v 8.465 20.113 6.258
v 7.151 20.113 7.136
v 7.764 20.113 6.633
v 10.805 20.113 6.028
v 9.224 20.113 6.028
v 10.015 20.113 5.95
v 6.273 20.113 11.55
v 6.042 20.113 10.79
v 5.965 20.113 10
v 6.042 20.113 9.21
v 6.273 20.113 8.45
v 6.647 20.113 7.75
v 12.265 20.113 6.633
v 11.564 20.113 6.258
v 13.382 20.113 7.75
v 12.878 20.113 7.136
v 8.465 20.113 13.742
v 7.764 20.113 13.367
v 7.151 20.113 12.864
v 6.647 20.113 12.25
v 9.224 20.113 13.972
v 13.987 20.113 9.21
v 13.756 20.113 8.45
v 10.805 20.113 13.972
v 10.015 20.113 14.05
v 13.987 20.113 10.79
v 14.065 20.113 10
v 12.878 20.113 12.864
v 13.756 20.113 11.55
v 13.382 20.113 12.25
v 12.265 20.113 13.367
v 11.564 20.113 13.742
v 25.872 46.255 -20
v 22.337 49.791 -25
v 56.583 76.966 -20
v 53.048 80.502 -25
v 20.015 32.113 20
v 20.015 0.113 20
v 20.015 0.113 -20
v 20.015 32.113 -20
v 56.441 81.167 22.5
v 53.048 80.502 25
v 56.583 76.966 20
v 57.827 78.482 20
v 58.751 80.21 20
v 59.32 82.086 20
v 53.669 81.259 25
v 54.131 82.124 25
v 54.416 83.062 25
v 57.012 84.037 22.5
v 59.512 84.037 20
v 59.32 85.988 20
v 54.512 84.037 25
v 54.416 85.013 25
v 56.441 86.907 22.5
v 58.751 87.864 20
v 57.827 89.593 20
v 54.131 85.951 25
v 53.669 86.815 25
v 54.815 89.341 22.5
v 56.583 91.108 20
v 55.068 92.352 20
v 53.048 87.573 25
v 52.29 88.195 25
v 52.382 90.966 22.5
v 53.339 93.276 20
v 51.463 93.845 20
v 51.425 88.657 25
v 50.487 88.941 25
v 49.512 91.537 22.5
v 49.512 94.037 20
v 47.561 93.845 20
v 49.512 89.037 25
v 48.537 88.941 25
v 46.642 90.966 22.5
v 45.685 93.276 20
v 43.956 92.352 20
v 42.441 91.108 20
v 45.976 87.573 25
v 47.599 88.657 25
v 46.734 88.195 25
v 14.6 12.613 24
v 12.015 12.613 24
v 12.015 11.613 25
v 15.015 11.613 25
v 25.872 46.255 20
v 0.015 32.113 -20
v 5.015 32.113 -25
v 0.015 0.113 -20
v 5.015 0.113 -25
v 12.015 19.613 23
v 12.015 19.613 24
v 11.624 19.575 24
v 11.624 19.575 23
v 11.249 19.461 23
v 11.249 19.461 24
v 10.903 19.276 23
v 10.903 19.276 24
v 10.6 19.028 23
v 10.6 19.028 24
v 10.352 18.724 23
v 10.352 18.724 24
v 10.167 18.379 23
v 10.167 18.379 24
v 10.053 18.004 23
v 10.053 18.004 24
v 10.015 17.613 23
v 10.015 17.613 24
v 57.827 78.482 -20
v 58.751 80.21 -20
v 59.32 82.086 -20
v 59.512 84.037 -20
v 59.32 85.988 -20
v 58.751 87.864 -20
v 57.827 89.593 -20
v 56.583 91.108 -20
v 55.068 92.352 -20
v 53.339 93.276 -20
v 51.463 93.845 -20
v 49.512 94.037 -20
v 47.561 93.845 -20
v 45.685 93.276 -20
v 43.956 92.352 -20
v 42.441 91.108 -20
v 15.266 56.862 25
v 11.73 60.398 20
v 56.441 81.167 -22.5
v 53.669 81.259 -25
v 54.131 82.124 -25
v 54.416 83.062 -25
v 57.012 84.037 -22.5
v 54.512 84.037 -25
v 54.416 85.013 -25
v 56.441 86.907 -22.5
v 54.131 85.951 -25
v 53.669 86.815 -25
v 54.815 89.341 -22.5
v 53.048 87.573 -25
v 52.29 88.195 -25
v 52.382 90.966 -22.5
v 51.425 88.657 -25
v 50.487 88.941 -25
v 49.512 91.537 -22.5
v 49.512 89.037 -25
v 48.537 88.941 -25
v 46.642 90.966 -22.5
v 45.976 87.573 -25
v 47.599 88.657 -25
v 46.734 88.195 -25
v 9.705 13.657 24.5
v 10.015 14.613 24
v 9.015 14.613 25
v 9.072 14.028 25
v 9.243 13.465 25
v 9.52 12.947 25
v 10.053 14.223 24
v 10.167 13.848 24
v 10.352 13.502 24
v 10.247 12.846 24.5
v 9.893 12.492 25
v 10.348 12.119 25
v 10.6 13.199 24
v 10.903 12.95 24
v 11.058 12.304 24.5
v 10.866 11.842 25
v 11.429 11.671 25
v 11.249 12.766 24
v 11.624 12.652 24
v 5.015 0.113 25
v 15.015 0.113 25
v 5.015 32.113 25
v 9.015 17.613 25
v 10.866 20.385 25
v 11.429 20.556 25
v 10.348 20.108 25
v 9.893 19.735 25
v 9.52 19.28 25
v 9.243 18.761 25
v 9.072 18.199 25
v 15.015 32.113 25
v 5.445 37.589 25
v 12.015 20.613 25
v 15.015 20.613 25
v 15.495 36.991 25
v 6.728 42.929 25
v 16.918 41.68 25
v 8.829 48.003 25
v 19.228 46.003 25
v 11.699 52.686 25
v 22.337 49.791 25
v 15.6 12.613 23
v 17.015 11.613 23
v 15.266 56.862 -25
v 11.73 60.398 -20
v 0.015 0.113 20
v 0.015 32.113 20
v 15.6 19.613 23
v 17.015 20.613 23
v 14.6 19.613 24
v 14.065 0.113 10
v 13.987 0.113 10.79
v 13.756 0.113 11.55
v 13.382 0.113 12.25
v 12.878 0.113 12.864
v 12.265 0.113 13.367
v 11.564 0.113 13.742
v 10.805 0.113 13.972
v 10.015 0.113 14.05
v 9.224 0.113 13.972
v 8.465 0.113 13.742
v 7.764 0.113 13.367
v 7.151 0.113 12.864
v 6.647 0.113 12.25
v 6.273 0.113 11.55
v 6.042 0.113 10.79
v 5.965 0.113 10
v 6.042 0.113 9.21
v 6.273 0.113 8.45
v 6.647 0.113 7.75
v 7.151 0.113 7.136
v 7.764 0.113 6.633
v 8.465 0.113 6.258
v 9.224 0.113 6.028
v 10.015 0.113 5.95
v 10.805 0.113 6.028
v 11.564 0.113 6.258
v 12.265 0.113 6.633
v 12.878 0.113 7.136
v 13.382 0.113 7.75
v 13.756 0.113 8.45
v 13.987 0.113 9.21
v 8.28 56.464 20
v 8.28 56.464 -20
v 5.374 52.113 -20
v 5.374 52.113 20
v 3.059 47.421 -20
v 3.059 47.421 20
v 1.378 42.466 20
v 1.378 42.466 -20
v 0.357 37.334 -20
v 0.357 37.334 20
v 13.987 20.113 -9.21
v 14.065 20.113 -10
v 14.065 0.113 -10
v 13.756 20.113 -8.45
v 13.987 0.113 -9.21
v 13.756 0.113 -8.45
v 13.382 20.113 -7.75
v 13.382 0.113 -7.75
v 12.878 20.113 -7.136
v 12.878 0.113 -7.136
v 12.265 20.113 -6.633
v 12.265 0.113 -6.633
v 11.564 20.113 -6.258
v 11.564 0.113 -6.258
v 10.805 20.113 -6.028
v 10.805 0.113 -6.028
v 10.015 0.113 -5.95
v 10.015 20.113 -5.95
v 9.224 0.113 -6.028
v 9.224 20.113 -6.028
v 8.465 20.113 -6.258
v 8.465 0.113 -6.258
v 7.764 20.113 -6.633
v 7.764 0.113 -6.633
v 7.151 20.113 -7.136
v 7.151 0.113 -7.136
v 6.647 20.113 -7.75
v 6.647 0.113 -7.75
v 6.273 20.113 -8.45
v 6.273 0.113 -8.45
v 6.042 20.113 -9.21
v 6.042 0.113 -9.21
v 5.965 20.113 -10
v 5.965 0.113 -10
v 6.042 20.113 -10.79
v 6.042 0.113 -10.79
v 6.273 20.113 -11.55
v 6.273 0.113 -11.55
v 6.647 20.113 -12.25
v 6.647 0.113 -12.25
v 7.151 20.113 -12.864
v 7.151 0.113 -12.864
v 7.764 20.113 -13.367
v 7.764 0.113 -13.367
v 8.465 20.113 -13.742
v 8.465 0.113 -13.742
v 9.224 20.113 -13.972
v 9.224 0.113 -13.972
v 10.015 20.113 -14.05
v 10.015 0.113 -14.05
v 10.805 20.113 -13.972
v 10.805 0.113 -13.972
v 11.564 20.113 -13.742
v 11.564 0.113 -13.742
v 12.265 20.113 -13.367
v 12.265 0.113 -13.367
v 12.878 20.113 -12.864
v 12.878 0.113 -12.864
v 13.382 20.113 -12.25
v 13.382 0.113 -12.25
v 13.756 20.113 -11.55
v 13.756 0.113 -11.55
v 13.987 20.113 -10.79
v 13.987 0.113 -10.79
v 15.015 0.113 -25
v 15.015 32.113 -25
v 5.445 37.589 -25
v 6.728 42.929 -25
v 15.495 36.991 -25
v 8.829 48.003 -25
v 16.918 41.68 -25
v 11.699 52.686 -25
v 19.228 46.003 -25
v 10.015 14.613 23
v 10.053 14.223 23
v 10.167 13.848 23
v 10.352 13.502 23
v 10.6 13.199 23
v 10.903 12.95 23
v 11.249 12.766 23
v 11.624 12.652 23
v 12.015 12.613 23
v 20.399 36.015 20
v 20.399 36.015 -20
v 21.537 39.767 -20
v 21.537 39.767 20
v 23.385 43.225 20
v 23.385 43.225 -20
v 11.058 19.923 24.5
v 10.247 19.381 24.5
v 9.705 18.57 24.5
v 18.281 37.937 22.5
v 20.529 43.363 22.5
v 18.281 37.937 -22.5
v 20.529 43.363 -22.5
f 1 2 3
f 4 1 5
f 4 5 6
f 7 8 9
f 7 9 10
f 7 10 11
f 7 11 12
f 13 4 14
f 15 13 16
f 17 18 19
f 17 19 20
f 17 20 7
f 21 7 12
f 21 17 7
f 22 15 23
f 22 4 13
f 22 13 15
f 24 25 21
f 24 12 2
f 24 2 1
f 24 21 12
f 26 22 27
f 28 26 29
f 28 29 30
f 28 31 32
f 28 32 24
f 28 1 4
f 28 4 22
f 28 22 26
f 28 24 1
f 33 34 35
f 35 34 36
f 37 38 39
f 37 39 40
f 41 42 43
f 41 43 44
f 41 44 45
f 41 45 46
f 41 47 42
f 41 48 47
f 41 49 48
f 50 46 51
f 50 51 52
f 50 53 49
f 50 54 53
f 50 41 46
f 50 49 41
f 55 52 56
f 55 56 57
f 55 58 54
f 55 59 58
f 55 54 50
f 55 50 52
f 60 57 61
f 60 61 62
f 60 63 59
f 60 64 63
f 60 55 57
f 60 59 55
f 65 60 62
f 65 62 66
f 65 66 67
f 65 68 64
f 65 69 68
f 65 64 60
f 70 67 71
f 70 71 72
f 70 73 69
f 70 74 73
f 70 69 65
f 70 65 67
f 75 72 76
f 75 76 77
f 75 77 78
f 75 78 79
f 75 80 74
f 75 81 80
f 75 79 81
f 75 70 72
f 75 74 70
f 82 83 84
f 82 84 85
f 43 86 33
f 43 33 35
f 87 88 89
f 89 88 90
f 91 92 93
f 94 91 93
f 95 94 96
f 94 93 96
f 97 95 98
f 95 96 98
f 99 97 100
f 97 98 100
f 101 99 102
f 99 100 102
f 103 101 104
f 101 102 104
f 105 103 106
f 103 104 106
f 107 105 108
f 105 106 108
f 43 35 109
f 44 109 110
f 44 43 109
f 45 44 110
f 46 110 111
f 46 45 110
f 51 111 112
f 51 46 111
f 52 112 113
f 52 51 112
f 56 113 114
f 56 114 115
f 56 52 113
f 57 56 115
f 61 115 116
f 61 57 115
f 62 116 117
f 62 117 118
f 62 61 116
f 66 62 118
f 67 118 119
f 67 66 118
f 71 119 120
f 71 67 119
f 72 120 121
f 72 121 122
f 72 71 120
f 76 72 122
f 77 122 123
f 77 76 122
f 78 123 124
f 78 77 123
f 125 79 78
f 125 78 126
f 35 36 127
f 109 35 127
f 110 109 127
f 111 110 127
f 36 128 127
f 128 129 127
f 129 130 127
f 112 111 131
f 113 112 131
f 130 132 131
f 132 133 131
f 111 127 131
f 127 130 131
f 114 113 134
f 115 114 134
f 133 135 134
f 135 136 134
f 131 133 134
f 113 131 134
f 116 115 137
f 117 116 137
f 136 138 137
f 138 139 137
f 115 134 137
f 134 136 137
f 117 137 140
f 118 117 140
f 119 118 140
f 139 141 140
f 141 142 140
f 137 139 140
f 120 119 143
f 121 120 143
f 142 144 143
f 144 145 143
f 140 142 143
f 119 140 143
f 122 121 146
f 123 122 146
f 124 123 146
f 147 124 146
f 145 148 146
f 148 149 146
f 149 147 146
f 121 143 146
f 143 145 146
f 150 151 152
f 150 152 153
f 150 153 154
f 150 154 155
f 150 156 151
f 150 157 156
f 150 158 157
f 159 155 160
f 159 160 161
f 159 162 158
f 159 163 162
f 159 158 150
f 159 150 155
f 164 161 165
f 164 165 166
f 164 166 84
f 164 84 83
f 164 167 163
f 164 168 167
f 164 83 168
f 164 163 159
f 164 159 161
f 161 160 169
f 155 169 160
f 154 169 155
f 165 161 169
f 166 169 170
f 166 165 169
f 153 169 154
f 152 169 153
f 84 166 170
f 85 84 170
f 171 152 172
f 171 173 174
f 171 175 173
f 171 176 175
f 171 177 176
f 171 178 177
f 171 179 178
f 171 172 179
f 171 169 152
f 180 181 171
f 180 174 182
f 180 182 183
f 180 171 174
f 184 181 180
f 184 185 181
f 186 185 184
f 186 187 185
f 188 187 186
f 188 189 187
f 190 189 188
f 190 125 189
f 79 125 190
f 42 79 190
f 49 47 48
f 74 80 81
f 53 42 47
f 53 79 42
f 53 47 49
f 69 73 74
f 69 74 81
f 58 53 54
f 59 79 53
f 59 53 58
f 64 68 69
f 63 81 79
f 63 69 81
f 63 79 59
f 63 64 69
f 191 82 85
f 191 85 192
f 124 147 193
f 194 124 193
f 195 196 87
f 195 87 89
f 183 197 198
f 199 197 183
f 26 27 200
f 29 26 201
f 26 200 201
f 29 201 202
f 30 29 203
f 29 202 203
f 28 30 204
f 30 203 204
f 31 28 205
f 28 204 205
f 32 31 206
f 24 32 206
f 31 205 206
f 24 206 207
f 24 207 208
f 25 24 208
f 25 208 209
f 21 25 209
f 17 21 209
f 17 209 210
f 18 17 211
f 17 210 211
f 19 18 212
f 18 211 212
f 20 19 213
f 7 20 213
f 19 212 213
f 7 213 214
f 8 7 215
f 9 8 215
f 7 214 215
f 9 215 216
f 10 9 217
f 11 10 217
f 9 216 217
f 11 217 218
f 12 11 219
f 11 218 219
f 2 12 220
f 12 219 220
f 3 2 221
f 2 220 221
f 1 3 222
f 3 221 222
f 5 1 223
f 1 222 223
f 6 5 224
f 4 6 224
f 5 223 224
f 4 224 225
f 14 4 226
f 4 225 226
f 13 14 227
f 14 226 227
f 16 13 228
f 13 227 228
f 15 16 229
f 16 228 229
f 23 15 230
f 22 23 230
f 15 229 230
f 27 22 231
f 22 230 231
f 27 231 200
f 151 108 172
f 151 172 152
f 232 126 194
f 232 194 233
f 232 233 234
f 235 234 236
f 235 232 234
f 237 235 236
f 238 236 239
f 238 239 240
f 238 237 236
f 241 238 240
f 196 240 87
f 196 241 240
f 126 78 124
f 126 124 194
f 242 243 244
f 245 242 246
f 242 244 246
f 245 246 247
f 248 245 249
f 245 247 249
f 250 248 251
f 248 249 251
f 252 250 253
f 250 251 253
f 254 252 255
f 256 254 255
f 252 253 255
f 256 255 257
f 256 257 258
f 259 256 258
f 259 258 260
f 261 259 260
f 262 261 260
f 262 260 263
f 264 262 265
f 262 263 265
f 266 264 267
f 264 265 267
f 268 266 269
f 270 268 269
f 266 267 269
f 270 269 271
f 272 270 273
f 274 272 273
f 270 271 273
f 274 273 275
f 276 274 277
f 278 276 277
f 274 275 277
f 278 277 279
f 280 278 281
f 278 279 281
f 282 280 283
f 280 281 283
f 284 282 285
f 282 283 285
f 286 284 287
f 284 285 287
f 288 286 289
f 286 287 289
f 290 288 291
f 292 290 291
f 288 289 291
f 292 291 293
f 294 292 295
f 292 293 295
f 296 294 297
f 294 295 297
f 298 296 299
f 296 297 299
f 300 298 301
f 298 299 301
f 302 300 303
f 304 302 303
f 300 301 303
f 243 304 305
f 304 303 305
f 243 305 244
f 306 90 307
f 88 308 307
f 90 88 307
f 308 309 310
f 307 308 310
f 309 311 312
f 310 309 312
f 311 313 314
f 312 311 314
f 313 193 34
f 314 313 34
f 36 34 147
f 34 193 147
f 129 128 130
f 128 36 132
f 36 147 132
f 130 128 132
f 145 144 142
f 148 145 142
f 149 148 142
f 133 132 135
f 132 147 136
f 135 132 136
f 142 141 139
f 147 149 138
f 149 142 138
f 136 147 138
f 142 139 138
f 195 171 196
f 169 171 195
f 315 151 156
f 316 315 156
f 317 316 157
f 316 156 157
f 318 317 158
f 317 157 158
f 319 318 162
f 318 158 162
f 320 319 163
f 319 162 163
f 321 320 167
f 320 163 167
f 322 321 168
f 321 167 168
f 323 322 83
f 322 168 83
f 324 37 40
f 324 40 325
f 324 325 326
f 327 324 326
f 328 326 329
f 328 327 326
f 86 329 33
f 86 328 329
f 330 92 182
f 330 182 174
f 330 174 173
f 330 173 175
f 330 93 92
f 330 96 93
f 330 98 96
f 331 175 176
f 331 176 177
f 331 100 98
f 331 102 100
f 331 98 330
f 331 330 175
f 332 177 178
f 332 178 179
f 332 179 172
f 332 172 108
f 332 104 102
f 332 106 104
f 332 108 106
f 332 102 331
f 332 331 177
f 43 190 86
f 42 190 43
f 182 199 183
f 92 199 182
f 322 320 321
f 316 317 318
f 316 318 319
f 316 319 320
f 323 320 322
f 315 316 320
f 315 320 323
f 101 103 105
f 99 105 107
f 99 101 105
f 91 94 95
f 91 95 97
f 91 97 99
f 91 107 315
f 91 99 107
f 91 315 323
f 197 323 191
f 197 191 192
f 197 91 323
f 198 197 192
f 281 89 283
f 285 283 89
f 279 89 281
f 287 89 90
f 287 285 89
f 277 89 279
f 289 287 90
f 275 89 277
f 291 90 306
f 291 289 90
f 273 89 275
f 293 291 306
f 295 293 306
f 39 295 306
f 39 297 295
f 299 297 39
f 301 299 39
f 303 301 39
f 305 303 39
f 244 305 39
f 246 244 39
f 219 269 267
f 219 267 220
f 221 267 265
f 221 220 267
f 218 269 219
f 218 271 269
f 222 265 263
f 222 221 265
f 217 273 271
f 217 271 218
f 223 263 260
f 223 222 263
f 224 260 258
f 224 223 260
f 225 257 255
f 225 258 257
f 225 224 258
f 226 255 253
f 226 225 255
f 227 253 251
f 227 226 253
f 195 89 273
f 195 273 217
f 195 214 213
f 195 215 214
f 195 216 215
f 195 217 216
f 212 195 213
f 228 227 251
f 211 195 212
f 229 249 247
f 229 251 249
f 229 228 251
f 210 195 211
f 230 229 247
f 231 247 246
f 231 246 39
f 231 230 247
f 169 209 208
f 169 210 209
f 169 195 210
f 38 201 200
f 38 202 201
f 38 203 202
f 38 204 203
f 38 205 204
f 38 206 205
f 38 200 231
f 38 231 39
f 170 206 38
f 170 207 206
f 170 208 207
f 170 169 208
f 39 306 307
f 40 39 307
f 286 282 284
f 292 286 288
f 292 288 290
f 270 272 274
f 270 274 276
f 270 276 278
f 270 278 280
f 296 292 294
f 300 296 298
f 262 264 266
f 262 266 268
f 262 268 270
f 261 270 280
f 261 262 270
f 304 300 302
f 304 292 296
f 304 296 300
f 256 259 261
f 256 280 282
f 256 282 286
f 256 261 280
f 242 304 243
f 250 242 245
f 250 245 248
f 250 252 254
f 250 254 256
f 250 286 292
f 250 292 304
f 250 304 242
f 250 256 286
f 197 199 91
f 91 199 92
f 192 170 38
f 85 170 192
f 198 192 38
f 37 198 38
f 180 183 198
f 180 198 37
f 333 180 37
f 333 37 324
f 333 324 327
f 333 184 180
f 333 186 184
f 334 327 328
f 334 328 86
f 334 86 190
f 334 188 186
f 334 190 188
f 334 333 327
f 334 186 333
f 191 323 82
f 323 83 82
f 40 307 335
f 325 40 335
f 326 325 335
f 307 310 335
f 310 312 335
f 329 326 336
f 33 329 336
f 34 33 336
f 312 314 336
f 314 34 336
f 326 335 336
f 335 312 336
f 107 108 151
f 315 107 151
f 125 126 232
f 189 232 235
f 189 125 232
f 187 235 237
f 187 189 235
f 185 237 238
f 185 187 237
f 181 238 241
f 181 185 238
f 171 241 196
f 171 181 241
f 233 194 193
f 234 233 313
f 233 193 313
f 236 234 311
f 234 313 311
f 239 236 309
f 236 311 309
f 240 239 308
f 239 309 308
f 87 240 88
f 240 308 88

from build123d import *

# Parameters (mm, degrees)
F1_DEPTH      = 25
F1_DEPTH_BACK = 25
F2_SIZE       = 5
F3_R          = 4.05
F4_DEPTH      = 20
F6_DEPTH      = 2
F7_SIZE       = 1


with BuildPart() as f1:
    # F0 (on Top) → F1 (new body, two sides)
    with BuildSketch(Plane.XY) as f1_sk:
        with BuildLine():
            Line((42.4409423598, 91.1082738708), (11.7302642411, 60.3975957521))
            ThreePointArc((11.7302642411, 60.3975957521), (3.0593541881, 47.4206617993), (0.0145354886, 32.1133245047))
            Line((0.0145354886, 32.1133245047), (0.0145354886, 0.1133245047))
            Line((0.0145354886, 0.1133245047), (20.0145354886, 0.1133245047))
            Line((20.0145354886, 0.1133245047), (20.0145354886, 32.1133245047))
            ThreePointArc((20.0145354886, 32.1133245047), (21.5369448383, 39.766993152), (25.8723998648, 46.2554601284))
            Line((25.8723998648, 46.2554601284), (56.5830779835, 76.9661382471))
            ThreePointArc((56.5830779835, 76.9661382471), (56.5830779835, 91.1082738708), (42.4409423598, 91.1082738708))
        make_face()
    extrude(amount=F1_DEPTH)
    extrude(f1_sk.sketch, amount=-F1_DEPTH_BACK)

    # F2
    f2_edges = [f1.edges().sort_by_distance(p)[0] for p in [
        (0.014535, 16.113325, 25),
        (3.059354, 47.420662, 25),
        (27.085603, 75.752935, 25),
        (56.583078, 91.108274, 25),
        (41.227739, 61.610799, 25),
        (21.536945, 39.766993, 25),
        (20.014535, 16.113325, 25),
        (41.227739, 61.610799, -25),
        (56.583078, 91.108274, -25),
        (27.085603, 75.752935, -25),
        (3.059354, 47.420662, -25),
        (0.014535, 16.113325, -25),
        (21.536945, 39.766993, -25),
        (20.014535, 16.113325, -25),
    ]]
    chamfer(f2_edges, length=F2_SIZE)

    # F3 (on face) → F4 (cut)
    with BuildSketch(Plane.XZ.offset(-0.1133245047)):
        with Locations((10.0145354886, 10)):
            Circle(F3_R)
        with Locations((10.0145354886, -10)):
            Circle(F3_R)
    extrude(amount=-F4_DEPTH, mode=Mode.SUBTRACT)

    # F5 (on face) → F6 (cut)
    with BuildSketch(Plane.XY.offset(25)):
        with BuildLine():
            Line((12.0145354886, 12.6133245047), (20.0145354886, 12.6133245047))
            Line((20.0145354886, 12.6133245047), (20.0145354886, 19.6133245047))
            Line((20.0145354886, 19.6133245047), (12.0145354886, 19.6133245047))
            ThreePointArc((12.0145354886, 19.6133245047), (10.6003219262, 19.027538067), (10.0145354886, 17.6133245047))
            Line((10.0145354886, 17.6133245047), (10.0145354886, 14.6133245047))
            ThreePointArc((10.0145354886, 14.6133245047), (10.6003219262, 13.1991109423), (12.0145354886, 12.6133245047))
        make_face()
    extrude(amount=-F6_DEPTH, mode=Mode.SUBTRACT)

    # F7
    f7_edges = [f1.edges().sort_by_distance(p)[0] for p in [
        (10.600322, 19.027538, 25),
        (10.014535, 16.113325, 25),
        (10.600322, 13.199111, 25),
        (13.514535, 12.613325, 25),
        (16.014535, 12.613325, 24),
        (13.514535, 19.613325, 25),
        (16.014535, 19.613325, 24),
    ]]
    chamfer(f7_edges, length=F7_SIZE)


solid = f1.part
